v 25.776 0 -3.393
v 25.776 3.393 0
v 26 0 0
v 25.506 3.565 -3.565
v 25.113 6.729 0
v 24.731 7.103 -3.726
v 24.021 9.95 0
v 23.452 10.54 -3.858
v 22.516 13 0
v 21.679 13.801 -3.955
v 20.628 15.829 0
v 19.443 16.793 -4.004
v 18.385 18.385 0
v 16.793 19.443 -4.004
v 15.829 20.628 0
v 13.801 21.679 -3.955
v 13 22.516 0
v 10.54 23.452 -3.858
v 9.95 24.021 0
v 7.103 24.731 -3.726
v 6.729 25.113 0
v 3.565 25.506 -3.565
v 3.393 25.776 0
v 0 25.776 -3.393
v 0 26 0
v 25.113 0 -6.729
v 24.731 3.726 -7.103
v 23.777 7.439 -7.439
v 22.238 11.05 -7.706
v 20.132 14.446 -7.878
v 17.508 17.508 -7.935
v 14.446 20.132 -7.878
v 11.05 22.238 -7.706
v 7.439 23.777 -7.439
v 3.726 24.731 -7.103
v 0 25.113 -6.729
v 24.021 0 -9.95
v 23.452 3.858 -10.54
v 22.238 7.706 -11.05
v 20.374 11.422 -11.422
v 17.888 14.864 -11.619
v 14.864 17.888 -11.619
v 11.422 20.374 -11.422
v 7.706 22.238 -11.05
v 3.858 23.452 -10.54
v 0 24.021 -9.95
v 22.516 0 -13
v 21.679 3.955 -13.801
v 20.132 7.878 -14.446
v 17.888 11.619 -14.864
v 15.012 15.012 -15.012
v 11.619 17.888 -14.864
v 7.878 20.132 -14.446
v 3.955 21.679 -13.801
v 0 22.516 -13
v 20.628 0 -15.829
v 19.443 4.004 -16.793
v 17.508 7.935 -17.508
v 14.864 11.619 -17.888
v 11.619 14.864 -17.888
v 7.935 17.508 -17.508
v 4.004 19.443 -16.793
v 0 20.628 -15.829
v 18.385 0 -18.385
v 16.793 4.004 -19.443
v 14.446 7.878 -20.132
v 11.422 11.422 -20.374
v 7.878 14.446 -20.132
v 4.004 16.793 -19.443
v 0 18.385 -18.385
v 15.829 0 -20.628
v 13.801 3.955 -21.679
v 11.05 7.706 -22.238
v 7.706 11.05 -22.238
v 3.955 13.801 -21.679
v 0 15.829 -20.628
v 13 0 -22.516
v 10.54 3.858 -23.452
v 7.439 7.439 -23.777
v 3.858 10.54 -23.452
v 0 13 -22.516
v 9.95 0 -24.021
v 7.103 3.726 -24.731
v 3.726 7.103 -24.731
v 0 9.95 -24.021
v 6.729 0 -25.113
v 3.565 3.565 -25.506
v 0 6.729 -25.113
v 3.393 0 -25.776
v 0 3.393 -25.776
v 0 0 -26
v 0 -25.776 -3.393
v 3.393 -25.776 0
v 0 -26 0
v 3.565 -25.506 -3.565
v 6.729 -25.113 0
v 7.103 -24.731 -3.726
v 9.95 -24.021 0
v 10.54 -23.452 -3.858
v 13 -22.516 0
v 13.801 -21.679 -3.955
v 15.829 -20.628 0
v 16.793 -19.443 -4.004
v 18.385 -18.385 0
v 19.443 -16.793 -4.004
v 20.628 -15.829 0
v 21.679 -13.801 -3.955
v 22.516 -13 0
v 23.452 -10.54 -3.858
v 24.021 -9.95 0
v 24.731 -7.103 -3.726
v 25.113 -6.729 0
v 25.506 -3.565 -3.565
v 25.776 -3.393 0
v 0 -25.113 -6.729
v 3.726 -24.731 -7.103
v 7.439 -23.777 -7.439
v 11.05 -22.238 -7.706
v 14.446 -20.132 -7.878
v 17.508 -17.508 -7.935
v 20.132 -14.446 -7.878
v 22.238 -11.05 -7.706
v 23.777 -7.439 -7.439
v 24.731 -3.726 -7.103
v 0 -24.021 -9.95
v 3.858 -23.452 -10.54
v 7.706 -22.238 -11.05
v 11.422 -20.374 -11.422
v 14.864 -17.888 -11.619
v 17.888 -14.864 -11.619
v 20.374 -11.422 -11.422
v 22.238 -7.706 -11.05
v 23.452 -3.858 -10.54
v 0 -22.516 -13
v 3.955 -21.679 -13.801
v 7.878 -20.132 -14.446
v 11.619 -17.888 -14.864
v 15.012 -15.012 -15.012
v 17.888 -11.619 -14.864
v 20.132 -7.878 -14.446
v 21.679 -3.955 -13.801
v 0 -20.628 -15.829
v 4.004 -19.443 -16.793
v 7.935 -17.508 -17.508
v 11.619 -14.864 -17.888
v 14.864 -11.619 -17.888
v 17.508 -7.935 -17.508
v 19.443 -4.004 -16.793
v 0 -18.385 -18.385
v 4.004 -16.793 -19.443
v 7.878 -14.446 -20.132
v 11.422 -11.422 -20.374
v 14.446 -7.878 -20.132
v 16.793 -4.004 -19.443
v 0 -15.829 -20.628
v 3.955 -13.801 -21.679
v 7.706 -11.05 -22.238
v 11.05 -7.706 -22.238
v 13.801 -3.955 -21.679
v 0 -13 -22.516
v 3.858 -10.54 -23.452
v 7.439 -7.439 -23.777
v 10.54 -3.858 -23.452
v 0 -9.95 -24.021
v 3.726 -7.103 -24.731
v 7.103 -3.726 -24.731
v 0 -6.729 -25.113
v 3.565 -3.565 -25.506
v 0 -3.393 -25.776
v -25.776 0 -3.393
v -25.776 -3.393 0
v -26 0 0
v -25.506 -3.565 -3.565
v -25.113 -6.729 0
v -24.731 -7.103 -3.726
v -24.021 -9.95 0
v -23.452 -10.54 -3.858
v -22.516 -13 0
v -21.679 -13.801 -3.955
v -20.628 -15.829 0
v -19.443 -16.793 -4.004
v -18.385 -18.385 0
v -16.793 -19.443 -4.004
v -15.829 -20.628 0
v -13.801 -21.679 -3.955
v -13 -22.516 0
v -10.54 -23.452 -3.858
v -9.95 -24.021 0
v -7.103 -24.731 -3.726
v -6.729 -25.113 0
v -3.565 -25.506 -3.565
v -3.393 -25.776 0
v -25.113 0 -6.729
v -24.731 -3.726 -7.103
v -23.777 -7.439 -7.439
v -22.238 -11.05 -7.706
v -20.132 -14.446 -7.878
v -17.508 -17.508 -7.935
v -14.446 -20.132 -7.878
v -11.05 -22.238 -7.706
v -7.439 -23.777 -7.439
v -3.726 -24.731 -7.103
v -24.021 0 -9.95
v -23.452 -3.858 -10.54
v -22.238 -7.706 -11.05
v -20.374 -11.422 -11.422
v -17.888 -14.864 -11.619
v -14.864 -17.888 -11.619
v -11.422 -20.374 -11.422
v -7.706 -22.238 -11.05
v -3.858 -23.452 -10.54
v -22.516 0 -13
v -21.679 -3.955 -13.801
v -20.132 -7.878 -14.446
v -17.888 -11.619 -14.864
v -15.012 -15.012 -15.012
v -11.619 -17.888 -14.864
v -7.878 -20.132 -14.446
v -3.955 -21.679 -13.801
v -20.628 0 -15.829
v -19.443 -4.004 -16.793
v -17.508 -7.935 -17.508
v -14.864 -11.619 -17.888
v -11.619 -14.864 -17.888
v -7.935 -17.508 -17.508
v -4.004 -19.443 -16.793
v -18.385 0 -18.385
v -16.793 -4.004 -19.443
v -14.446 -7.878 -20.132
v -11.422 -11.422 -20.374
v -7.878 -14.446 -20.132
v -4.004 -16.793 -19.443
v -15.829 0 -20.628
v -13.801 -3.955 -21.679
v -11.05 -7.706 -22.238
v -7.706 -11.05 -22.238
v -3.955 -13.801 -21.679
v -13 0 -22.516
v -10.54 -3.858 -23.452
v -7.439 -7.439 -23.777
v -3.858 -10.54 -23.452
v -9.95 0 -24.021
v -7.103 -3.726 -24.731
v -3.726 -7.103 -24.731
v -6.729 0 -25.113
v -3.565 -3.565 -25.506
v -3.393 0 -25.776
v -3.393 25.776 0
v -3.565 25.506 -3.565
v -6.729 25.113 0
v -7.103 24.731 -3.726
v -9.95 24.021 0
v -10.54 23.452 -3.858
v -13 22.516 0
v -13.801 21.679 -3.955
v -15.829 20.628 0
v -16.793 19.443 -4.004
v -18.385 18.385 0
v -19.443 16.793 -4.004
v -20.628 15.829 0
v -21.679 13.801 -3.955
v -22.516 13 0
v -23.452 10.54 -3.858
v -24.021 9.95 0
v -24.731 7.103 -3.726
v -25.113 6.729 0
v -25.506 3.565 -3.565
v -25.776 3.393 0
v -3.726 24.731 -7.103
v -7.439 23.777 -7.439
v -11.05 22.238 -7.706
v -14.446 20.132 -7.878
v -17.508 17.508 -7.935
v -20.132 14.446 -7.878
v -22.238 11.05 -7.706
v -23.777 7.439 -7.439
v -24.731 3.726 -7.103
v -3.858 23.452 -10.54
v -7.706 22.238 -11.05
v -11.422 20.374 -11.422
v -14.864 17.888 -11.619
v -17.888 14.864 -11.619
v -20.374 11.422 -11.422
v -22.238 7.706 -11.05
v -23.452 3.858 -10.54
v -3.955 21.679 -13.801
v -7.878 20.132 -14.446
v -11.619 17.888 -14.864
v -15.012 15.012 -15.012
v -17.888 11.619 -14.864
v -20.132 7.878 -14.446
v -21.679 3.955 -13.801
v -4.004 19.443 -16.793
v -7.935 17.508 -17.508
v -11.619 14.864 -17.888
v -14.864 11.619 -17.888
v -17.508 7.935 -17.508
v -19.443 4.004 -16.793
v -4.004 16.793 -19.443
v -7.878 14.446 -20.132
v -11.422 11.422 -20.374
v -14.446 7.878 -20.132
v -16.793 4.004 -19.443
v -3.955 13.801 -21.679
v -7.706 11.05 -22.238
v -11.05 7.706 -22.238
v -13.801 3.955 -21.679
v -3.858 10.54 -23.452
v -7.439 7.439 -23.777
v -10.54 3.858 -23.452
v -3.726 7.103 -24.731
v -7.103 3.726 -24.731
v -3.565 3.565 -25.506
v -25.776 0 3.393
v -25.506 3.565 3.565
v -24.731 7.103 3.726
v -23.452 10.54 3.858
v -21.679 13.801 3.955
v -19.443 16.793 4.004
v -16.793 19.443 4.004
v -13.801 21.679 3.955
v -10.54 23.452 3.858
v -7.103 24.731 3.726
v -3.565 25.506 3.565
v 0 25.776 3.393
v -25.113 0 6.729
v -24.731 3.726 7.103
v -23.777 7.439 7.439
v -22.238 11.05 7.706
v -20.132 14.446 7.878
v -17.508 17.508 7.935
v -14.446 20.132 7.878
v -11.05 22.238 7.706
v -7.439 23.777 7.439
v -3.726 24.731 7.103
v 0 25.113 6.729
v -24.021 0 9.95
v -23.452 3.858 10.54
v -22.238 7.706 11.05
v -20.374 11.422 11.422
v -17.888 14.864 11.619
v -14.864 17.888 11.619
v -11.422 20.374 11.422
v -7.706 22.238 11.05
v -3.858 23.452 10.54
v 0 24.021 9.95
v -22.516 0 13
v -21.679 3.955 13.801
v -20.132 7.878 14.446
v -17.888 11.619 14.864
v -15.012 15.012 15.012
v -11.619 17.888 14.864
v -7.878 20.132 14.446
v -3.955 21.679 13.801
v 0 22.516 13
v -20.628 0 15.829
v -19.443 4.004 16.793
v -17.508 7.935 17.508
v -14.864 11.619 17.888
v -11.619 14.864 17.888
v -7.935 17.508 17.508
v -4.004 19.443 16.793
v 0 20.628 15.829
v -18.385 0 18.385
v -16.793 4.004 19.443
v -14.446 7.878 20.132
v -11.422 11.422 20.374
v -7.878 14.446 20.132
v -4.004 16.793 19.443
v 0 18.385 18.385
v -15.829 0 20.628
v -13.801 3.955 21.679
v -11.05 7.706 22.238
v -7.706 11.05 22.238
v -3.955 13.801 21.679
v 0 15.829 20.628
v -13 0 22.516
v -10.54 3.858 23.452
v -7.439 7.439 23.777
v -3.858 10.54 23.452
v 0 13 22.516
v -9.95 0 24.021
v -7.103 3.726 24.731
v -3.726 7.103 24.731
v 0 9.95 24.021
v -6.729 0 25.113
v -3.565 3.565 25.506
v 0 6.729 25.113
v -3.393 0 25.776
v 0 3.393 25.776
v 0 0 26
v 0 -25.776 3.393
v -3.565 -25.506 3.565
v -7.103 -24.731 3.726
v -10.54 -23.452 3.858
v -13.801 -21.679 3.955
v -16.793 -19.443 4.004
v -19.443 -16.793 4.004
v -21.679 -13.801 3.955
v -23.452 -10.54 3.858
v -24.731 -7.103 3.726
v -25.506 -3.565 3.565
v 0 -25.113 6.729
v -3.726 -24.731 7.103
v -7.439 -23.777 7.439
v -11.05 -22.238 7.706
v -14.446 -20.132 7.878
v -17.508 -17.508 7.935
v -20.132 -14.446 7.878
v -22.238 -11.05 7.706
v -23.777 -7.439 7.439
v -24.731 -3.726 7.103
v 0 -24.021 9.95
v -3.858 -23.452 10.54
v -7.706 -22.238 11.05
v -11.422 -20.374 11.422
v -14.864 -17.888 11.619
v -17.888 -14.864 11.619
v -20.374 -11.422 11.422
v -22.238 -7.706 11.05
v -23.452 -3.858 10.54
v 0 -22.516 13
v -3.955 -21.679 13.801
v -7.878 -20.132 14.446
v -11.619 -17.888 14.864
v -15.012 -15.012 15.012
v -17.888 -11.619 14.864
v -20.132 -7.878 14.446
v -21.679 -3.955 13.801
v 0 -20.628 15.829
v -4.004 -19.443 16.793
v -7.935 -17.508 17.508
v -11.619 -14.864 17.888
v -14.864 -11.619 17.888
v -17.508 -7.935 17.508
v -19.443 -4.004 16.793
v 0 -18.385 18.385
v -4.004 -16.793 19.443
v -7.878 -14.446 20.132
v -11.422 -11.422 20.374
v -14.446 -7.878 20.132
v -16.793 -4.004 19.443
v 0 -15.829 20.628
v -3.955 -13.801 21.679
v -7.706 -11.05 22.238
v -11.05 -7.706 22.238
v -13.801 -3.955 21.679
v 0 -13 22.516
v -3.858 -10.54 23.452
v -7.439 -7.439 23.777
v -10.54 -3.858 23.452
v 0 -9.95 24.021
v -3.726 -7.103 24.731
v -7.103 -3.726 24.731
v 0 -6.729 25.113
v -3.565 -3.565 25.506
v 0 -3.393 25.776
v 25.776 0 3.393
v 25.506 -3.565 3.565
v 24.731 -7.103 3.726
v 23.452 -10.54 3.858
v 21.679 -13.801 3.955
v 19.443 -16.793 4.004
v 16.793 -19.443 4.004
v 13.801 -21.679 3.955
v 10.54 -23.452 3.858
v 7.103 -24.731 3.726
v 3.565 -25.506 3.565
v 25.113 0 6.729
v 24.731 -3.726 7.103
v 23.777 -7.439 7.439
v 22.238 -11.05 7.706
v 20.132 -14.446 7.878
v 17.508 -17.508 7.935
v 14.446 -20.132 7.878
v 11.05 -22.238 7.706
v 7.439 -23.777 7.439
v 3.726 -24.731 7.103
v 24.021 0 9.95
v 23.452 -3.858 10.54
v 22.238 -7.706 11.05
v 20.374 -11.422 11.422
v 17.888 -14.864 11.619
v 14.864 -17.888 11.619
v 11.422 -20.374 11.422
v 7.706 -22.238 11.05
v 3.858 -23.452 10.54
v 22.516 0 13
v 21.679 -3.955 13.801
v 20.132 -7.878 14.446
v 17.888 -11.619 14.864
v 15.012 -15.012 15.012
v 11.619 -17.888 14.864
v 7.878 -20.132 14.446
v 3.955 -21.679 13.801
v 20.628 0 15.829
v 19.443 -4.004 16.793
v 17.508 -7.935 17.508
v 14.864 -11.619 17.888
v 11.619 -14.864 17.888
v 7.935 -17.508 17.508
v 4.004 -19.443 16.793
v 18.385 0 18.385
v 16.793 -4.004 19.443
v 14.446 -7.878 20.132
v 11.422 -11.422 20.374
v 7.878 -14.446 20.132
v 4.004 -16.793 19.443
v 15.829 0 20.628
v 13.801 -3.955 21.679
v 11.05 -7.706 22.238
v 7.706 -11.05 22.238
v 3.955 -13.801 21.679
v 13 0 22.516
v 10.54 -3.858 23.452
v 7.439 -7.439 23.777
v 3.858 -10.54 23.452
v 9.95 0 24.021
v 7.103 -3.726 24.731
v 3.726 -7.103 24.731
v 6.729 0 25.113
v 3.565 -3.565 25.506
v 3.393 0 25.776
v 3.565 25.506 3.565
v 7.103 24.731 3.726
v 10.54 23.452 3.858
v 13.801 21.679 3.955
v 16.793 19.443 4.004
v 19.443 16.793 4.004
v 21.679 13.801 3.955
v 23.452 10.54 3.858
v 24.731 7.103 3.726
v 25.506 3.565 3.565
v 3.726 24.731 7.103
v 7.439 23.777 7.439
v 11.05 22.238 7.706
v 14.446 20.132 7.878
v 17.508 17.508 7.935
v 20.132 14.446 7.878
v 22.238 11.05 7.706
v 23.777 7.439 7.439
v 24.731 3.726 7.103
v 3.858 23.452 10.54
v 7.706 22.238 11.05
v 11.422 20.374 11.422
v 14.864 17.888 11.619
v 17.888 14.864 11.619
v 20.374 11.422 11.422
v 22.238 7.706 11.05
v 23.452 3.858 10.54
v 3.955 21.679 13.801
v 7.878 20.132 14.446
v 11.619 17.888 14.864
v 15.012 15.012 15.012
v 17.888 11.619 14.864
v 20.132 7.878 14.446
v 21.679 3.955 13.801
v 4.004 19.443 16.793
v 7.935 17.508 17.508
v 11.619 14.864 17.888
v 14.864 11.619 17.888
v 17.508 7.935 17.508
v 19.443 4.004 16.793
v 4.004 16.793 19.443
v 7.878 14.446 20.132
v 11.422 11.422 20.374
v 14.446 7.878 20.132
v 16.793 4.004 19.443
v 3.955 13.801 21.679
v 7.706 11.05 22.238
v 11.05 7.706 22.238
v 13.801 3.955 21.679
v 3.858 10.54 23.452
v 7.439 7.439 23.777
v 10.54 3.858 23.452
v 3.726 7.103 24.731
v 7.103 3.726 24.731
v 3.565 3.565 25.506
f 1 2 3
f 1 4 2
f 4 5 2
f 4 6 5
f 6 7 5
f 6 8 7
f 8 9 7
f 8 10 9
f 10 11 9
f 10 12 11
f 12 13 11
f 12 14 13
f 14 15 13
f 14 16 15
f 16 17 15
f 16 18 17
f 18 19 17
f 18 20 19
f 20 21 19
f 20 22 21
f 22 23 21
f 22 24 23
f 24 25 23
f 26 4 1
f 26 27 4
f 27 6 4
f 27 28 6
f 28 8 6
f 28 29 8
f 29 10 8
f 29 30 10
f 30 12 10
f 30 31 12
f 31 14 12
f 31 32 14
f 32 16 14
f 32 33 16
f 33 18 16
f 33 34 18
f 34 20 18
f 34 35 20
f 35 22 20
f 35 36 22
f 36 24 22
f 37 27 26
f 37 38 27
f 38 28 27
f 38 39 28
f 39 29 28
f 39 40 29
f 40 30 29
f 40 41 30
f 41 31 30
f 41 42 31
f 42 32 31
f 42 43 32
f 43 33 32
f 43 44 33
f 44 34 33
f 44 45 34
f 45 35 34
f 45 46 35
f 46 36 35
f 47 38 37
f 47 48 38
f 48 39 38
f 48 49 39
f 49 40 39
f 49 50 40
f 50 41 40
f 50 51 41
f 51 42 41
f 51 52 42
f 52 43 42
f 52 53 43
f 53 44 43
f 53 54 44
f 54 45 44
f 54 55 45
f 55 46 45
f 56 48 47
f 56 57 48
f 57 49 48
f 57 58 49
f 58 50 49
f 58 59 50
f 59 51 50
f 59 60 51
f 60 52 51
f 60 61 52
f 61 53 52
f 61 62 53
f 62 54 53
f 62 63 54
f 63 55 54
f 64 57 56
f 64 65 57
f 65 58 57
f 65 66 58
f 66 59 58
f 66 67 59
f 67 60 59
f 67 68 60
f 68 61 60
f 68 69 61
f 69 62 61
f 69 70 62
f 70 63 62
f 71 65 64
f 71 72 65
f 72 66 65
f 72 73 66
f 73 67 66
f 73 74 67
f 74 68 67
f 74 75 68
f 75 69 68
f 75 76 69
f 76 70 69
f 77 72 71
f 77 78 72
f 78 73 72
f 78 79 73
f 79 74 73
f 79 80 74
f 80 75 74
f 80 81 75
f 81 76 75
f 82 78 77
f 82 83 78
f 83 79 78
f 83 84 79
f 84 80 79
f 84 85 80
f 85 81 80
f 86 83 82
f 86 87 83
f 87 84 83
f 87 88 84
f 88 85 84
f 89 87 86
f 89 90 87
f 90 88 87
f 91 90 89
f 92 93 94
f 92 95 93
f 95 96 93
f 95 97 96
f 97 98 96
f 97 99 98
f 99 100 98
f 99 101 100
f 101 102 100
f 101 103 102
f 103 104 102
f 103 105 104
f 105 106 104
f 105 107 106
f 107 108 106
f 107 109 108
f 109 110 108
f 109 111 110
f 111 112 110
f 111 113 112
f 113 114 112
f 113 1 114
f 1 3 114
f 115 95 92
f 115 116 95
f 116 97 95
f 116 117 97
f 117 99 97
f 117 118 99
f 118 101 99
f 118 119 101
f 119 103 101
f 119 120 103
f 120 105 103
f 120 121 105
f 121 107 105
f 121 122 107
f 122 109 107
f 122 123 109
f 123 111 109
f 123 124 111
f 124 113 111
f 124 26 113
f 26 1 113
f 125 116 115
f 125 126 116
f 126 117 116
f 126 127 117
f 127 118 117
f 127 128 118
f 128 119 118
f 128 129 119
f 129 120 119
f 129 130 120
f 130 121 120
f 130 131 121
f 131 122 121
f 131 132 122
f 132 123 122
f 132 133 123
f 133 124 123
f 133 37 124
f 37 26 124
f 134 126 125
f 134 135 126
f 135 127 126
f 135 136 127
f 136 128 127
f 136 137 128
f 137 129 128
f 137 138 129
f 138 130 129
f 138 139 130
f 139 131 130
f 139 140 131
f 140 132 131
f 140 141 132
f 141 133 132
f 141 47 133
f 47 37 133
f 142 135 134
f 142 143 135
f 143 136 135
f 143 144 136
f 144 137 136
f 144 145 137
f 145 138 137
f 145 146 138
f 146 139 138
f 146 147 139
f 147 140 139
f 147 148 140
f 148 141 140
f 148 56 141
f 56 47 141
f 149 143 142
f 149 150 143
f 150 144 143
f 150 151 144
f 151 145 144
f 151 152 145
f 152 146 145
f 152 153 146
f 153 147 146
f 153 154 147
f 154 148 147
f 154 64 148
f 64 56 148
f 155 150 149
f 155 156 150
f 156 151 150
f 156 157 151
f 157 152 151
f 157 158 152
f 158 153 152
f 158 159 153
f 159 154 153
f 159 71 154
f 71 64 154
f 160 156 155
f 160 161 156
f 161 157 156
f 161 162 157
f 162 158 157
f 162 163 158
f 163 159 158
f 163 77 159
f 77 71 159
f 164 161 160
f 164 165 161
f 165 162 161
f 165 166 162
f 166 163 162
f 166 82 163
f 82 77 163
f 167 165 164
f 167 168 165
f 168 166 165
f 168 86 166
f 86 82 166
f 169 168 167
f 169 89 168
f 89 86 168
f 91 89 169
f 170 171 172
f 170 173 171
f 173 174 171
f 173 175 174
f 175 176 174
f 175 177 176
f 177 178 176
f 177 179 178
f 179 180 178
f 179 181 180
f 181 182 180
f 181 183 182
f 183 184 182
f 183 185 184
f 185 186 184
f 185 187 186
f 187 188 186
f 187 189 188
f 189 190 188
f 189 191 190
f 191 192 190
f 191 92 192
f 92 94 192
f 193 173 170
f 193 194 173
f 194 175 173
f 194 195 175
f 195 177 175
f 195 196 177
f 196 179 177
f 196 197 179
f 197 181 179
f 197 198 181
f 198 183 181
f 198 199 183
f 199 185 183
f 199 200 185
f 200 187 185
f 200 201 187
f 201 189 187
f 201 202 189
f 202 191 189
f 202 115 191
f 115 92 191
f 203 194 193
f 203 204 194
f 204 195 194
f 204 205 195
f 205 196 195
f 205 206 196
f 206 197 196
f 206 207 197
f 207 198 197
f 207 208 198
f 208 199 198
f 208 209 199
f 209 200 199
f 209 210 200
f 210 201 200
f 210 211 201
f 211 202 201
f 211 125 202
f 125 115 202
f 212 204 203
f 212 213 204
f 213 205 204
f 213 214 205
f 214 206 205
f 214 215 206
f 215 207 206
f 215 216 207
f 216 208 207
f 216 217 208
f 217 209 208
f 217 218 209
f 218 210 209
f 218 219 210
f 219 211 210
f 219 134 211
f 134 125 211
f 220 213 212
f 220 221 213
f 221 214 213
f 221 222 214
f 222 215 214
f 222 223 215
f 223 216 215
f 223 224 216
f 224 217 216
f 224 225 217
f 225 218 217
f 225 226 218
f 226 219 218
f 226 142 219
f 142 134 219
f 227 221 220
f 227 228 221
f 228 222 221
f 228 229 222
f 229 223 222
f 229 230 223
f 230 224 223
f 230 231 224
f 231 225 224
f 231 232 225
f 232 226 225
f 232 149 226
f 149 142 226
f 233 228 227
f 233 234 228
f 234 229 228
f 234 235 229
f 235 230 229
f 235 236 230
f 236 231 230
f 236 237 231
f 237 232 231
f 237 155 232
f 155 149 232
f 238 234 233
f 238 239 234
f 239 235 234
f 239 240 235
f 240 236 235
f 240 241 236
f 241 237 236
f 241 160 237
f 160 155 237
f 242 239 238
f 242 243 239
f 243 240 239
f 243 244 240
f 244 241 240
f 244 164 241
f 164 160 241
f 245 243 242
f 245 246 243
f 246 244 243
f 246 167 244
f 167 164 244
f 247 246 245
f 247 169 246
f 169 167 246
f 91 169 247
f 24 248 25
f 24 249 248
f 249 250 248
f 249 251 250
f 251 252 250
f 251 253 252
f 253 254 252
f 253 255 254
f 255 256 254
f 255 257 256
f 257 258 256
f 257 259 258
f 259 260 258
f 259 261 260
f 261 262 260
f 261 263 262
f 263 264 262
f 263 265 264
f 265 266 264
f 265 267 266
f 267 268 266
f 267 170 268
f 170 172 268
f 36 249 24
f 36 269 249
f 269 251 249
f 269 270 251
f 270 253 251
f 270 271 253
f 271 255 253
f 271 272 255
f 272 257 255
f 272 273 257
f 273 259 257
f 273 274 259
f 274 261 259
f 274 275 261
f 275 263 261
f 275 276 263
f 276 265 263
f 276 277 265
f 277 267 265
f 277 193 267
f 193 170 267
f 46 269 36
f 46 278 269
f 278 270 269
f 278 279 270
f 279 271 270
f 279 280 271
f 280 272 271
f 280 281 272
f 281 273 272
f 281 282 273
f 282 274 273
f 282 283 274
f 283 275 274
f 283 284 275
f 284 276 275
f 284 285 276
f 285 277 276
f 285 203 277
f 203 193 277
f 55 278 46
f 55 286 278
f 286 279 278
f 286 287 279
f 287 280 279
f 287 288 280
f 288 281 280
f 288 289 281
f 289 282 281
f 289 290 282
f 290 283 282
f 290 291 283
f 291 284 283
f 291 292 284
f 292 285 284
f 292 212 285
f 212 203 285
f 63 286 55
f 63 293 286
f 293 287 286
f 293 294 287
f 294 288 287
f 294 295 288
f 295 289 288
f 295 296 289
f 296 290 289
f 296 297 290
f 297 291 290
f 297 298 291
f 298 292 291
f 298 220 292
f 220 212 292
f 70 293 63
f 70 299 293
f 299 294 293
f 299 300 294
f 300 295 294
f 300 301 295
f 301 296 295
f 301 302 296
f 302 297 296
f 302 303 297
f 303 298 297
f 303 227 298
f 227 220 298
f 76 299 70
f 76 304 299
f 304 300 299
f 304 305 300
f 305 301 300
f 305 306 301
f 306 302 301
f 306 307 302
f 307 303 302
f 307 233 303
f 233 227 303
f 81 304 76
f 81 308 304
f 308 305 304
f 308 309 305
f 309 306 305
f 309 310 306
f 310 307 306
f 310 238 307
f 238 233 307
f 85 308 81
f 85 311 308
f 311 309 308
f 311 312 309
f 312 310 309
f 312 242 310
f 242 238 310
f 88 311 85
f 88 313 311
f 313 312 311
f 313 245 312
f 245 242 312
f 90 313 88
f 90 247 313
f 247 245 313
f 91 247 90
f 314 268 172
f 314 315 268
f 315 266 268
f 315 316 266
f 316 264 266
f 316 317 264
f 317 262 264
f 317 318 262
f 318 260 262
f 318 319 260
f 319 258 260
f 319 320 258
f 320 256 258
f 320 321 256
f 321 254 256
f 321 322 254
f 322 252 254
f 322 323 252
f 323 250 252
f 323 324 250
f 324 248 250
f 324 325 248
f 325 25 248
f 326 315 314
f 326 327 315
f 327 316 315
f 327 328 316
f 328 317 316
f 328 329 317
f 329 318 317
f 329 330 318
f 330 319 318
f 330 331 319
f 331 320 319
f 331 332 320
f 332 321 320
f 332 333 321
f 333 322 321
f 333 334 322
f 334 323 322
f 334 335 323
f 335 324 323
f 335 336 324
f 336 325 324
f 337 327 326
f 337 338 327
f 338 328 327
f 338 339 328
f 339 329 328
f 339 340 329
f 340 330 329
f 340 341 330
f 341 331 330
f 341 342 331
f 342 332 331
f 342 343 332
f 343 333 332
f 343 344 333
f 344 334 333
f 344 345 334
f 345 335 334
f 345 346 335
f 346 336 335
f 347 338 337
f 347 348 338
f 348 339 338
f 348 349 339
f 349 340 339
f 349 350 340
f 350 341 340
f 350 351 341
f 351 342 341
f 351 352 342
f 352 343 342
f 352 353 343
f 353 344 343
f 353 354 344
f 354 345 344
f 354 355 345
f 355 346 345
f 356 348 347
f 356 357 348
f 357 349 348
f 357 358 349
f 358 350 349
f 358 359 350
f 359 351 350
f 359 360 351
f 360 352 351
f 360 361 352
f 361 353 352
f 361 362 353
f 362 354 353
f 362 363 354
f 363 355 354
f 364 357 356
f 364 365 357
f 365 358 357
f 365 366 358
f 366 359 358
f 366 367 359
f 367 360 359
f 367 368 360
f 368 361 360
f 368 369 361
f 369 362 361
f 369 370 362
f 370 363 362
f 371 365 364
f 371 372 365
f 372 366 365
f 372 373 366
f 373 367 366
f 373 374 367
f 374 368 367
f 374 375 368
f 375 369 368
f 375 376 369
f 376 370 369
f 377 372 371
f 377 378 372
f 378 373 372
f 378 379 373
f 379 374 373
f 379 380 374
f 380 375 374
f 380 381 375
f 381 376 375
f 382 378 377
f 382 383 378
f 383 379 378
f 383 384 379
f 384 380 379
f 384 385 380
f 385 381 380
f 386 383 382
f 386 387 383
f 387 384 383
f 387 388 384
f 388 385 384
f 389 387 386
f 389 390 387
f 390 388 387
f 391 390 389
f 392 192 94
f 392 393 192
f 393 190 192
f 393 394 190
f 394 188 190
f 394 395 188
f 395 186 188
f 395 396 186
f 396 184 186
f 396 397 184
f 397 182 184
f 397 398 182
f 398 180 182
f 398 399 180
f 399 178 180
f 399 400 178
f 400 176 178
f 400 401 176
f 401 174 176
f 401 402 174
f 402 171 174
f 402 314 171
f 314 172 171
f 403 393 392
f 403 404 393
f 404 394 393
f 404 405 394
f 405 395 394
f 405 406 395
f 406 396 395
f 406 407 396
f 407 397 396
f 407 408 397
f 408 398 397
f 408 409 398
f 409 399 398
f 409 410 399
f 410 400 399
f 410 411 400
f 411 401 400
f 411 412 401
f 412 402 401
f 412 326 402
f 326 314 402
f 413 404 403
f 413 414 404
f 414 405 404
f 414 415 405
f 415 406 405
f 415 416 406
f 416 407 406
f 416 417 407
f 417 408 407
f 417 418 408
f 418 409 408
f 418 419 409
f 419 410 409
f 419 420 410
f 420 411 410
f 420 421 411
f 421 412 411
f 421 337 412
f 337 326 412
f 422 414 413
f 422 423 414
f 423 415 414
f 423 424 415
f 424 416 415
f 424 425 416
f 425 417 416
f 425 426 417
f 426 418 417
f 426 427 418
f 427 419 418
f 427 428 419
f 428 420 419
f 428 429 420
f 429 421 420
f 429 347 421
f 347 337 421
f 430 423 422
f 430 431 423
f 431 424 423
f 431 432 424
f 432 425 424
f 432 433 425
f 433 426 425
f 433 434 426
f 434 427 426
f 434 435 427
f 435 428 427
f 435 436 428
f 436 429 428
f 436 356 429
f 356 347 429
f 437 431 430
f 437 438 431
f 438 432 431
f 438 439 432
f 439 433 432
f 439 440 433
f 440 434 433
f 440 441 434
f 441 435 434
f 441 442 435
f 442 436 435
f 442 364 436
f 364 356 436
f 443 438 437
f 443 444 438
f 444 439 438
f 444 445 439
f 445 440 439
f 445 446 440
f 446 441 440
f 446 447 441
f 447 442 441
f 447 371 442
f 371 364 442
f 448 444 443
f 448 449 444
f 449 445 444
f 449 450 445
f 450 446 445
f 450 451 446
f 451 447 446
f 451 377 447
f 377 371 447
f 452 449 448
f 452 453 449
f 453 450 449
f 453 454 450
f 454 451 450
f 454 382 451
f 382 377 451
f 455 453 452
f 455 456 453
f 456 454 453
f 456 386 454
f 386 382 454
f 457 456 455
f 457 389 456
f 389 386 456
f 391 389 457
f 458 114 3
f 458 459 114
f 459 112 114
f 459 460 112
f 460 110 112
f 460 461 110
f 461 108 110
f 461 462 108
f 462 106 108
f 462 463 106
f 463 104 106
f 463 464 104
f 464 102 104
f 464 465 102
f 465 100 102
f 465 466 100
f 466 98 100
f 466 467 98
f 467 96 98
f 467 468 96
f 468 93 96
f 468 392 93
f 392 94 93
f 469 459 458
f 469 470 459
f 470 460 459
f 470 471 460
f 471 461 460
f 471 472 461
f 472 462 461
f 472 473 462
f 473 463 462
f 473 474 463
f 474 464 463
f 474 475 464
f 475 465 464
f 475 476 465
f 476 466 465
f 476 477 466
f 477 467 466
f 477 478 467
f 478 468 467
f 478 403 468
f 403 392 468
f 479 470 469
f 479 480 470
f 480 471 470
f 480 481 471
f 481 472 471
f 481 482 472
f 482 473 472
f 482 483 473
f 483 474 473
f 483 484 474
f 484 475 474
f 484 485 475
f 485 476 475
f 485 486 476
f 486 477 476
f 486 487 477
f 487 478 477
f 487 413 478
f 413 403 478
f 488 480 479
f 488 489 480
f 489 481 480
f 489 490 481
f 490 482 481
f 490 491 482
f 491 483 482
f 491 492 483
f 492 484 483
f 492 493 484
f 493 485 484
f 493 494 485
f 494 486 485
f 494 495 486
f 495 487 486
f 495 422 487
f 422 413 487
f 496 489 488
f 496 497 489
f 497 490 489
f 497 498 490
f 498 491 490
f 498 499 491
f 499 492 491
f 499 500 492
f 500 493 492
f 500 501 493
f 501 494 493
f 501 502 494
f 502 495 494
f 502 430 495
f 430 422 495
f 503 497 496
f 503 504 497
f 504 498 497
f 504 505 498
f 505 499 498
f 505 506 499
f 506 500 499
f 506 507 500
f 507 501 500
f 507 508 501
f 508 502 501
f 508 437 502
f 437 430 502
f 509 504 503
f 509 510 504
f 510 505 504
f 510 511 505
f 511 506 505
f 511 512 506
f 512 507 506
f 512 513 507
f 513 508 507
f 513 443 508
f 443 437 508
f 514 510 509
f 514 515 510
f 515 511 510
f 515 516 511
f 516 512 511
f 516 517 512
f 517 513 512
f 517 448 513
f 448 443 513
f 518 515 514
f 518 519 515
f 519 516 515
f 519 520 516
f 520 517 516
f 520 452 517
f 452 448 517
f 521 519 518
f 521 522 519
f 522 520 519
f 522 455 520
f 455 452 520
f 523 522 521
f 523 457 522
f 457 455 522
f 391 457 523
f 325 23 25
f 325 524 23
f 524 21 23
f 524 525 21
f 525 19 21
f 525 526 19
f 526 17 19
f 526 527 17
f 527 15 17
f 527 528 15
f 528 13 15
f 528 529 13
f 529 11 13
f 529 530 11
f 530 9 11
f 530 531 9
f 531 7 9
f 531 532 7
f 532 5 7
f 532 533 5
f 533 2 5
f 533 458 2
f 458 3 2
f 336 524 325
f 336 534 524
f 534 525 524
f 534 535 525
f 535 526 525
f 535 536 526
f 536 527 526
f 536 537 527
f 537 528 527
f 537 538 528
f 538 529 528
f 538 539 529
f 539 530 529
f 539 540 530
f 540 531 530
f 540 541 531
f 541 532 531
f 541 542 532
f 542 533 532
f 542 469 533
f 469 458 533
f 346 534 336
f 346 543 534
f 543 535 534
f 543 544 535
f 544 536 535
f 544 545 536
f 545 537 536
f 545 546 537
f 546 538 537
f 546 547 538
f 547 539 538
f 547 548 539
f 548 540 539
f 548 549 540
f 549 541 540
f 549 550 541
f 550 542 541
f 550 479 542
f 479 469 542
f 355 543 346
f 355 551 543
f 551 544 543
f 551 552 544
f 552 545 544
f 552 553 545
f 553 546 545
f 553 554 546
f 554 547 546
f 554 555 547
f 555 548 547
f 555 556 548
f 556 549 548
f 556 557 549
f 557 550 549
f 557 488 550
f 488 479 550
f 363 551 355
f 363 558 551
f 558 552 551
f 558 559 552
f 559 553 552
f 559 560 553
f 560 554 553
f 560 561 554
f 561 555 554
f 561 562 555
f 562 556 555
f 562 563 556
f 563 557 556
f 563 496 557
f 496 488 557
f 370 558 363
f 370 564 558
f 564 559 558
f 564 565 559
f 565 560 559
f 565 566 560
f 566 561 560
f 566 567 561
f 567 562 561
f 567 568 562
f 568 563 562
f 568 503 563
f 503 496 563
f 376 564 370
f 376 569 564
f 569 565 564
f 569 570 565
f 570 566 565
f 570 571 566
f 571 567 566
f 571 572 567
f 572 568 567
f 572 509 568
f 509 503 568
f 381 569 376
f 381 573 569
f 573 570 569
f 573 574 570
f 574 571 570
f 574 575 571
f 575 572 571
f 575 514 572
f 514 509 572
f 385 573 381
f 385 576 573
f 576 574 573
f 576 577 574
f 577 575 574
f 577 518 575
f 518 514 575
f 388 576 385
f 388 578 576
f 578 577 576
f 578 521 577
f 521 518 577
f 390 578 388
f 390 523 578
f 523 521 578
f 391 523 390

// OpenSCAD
use <../lib.scad>
use <../p/48/8-8sphe.scad>
$fa=1; $fs=0.2;
function ldraw_lib__22119(realsolid=false) = [
// 0 Ball 52mm Diameter
// 0 Name: 22119.dat
// 0 Author: Philippe Hurbain [Philo]
// 0 !LDRAW_ORG Part UPDATE 2012-01
// 0 !LICENSE Licensed under CC BY 2.0 and CC BY 4.0 : see CAreadme.txt
// 
// 0 BFC CERTIFY CCW
  [0,"BFC","CERTIFY"],
  [0,"BFC","CCW"],
// 
// 0 !CATEGORY Sphere
// 
// 0 !HISTORY 2012-03-30 [PTadmin] Official Update 2012-01
// 
// 
// 1 16 0 0 0 65 0 0 0 65 0 0 0 65 48\8-8sphe.dat
  [1,16,0,0,0,65,0,0,0,65,0,0,0,65, ldraw_lib__48__8_8sphe(realsolid)],
// 0
];
module ldraw_lib__22119(step=0, col=false, unit=2/5, alt=false, line=0.2, solid=!$preview)
    makepoly(ldraw_lib__22119(solid), step=step, col=col, unit=unit, alt=alt, line=line, solid=solid);
ldraw_lib__22119(line=0.2);
